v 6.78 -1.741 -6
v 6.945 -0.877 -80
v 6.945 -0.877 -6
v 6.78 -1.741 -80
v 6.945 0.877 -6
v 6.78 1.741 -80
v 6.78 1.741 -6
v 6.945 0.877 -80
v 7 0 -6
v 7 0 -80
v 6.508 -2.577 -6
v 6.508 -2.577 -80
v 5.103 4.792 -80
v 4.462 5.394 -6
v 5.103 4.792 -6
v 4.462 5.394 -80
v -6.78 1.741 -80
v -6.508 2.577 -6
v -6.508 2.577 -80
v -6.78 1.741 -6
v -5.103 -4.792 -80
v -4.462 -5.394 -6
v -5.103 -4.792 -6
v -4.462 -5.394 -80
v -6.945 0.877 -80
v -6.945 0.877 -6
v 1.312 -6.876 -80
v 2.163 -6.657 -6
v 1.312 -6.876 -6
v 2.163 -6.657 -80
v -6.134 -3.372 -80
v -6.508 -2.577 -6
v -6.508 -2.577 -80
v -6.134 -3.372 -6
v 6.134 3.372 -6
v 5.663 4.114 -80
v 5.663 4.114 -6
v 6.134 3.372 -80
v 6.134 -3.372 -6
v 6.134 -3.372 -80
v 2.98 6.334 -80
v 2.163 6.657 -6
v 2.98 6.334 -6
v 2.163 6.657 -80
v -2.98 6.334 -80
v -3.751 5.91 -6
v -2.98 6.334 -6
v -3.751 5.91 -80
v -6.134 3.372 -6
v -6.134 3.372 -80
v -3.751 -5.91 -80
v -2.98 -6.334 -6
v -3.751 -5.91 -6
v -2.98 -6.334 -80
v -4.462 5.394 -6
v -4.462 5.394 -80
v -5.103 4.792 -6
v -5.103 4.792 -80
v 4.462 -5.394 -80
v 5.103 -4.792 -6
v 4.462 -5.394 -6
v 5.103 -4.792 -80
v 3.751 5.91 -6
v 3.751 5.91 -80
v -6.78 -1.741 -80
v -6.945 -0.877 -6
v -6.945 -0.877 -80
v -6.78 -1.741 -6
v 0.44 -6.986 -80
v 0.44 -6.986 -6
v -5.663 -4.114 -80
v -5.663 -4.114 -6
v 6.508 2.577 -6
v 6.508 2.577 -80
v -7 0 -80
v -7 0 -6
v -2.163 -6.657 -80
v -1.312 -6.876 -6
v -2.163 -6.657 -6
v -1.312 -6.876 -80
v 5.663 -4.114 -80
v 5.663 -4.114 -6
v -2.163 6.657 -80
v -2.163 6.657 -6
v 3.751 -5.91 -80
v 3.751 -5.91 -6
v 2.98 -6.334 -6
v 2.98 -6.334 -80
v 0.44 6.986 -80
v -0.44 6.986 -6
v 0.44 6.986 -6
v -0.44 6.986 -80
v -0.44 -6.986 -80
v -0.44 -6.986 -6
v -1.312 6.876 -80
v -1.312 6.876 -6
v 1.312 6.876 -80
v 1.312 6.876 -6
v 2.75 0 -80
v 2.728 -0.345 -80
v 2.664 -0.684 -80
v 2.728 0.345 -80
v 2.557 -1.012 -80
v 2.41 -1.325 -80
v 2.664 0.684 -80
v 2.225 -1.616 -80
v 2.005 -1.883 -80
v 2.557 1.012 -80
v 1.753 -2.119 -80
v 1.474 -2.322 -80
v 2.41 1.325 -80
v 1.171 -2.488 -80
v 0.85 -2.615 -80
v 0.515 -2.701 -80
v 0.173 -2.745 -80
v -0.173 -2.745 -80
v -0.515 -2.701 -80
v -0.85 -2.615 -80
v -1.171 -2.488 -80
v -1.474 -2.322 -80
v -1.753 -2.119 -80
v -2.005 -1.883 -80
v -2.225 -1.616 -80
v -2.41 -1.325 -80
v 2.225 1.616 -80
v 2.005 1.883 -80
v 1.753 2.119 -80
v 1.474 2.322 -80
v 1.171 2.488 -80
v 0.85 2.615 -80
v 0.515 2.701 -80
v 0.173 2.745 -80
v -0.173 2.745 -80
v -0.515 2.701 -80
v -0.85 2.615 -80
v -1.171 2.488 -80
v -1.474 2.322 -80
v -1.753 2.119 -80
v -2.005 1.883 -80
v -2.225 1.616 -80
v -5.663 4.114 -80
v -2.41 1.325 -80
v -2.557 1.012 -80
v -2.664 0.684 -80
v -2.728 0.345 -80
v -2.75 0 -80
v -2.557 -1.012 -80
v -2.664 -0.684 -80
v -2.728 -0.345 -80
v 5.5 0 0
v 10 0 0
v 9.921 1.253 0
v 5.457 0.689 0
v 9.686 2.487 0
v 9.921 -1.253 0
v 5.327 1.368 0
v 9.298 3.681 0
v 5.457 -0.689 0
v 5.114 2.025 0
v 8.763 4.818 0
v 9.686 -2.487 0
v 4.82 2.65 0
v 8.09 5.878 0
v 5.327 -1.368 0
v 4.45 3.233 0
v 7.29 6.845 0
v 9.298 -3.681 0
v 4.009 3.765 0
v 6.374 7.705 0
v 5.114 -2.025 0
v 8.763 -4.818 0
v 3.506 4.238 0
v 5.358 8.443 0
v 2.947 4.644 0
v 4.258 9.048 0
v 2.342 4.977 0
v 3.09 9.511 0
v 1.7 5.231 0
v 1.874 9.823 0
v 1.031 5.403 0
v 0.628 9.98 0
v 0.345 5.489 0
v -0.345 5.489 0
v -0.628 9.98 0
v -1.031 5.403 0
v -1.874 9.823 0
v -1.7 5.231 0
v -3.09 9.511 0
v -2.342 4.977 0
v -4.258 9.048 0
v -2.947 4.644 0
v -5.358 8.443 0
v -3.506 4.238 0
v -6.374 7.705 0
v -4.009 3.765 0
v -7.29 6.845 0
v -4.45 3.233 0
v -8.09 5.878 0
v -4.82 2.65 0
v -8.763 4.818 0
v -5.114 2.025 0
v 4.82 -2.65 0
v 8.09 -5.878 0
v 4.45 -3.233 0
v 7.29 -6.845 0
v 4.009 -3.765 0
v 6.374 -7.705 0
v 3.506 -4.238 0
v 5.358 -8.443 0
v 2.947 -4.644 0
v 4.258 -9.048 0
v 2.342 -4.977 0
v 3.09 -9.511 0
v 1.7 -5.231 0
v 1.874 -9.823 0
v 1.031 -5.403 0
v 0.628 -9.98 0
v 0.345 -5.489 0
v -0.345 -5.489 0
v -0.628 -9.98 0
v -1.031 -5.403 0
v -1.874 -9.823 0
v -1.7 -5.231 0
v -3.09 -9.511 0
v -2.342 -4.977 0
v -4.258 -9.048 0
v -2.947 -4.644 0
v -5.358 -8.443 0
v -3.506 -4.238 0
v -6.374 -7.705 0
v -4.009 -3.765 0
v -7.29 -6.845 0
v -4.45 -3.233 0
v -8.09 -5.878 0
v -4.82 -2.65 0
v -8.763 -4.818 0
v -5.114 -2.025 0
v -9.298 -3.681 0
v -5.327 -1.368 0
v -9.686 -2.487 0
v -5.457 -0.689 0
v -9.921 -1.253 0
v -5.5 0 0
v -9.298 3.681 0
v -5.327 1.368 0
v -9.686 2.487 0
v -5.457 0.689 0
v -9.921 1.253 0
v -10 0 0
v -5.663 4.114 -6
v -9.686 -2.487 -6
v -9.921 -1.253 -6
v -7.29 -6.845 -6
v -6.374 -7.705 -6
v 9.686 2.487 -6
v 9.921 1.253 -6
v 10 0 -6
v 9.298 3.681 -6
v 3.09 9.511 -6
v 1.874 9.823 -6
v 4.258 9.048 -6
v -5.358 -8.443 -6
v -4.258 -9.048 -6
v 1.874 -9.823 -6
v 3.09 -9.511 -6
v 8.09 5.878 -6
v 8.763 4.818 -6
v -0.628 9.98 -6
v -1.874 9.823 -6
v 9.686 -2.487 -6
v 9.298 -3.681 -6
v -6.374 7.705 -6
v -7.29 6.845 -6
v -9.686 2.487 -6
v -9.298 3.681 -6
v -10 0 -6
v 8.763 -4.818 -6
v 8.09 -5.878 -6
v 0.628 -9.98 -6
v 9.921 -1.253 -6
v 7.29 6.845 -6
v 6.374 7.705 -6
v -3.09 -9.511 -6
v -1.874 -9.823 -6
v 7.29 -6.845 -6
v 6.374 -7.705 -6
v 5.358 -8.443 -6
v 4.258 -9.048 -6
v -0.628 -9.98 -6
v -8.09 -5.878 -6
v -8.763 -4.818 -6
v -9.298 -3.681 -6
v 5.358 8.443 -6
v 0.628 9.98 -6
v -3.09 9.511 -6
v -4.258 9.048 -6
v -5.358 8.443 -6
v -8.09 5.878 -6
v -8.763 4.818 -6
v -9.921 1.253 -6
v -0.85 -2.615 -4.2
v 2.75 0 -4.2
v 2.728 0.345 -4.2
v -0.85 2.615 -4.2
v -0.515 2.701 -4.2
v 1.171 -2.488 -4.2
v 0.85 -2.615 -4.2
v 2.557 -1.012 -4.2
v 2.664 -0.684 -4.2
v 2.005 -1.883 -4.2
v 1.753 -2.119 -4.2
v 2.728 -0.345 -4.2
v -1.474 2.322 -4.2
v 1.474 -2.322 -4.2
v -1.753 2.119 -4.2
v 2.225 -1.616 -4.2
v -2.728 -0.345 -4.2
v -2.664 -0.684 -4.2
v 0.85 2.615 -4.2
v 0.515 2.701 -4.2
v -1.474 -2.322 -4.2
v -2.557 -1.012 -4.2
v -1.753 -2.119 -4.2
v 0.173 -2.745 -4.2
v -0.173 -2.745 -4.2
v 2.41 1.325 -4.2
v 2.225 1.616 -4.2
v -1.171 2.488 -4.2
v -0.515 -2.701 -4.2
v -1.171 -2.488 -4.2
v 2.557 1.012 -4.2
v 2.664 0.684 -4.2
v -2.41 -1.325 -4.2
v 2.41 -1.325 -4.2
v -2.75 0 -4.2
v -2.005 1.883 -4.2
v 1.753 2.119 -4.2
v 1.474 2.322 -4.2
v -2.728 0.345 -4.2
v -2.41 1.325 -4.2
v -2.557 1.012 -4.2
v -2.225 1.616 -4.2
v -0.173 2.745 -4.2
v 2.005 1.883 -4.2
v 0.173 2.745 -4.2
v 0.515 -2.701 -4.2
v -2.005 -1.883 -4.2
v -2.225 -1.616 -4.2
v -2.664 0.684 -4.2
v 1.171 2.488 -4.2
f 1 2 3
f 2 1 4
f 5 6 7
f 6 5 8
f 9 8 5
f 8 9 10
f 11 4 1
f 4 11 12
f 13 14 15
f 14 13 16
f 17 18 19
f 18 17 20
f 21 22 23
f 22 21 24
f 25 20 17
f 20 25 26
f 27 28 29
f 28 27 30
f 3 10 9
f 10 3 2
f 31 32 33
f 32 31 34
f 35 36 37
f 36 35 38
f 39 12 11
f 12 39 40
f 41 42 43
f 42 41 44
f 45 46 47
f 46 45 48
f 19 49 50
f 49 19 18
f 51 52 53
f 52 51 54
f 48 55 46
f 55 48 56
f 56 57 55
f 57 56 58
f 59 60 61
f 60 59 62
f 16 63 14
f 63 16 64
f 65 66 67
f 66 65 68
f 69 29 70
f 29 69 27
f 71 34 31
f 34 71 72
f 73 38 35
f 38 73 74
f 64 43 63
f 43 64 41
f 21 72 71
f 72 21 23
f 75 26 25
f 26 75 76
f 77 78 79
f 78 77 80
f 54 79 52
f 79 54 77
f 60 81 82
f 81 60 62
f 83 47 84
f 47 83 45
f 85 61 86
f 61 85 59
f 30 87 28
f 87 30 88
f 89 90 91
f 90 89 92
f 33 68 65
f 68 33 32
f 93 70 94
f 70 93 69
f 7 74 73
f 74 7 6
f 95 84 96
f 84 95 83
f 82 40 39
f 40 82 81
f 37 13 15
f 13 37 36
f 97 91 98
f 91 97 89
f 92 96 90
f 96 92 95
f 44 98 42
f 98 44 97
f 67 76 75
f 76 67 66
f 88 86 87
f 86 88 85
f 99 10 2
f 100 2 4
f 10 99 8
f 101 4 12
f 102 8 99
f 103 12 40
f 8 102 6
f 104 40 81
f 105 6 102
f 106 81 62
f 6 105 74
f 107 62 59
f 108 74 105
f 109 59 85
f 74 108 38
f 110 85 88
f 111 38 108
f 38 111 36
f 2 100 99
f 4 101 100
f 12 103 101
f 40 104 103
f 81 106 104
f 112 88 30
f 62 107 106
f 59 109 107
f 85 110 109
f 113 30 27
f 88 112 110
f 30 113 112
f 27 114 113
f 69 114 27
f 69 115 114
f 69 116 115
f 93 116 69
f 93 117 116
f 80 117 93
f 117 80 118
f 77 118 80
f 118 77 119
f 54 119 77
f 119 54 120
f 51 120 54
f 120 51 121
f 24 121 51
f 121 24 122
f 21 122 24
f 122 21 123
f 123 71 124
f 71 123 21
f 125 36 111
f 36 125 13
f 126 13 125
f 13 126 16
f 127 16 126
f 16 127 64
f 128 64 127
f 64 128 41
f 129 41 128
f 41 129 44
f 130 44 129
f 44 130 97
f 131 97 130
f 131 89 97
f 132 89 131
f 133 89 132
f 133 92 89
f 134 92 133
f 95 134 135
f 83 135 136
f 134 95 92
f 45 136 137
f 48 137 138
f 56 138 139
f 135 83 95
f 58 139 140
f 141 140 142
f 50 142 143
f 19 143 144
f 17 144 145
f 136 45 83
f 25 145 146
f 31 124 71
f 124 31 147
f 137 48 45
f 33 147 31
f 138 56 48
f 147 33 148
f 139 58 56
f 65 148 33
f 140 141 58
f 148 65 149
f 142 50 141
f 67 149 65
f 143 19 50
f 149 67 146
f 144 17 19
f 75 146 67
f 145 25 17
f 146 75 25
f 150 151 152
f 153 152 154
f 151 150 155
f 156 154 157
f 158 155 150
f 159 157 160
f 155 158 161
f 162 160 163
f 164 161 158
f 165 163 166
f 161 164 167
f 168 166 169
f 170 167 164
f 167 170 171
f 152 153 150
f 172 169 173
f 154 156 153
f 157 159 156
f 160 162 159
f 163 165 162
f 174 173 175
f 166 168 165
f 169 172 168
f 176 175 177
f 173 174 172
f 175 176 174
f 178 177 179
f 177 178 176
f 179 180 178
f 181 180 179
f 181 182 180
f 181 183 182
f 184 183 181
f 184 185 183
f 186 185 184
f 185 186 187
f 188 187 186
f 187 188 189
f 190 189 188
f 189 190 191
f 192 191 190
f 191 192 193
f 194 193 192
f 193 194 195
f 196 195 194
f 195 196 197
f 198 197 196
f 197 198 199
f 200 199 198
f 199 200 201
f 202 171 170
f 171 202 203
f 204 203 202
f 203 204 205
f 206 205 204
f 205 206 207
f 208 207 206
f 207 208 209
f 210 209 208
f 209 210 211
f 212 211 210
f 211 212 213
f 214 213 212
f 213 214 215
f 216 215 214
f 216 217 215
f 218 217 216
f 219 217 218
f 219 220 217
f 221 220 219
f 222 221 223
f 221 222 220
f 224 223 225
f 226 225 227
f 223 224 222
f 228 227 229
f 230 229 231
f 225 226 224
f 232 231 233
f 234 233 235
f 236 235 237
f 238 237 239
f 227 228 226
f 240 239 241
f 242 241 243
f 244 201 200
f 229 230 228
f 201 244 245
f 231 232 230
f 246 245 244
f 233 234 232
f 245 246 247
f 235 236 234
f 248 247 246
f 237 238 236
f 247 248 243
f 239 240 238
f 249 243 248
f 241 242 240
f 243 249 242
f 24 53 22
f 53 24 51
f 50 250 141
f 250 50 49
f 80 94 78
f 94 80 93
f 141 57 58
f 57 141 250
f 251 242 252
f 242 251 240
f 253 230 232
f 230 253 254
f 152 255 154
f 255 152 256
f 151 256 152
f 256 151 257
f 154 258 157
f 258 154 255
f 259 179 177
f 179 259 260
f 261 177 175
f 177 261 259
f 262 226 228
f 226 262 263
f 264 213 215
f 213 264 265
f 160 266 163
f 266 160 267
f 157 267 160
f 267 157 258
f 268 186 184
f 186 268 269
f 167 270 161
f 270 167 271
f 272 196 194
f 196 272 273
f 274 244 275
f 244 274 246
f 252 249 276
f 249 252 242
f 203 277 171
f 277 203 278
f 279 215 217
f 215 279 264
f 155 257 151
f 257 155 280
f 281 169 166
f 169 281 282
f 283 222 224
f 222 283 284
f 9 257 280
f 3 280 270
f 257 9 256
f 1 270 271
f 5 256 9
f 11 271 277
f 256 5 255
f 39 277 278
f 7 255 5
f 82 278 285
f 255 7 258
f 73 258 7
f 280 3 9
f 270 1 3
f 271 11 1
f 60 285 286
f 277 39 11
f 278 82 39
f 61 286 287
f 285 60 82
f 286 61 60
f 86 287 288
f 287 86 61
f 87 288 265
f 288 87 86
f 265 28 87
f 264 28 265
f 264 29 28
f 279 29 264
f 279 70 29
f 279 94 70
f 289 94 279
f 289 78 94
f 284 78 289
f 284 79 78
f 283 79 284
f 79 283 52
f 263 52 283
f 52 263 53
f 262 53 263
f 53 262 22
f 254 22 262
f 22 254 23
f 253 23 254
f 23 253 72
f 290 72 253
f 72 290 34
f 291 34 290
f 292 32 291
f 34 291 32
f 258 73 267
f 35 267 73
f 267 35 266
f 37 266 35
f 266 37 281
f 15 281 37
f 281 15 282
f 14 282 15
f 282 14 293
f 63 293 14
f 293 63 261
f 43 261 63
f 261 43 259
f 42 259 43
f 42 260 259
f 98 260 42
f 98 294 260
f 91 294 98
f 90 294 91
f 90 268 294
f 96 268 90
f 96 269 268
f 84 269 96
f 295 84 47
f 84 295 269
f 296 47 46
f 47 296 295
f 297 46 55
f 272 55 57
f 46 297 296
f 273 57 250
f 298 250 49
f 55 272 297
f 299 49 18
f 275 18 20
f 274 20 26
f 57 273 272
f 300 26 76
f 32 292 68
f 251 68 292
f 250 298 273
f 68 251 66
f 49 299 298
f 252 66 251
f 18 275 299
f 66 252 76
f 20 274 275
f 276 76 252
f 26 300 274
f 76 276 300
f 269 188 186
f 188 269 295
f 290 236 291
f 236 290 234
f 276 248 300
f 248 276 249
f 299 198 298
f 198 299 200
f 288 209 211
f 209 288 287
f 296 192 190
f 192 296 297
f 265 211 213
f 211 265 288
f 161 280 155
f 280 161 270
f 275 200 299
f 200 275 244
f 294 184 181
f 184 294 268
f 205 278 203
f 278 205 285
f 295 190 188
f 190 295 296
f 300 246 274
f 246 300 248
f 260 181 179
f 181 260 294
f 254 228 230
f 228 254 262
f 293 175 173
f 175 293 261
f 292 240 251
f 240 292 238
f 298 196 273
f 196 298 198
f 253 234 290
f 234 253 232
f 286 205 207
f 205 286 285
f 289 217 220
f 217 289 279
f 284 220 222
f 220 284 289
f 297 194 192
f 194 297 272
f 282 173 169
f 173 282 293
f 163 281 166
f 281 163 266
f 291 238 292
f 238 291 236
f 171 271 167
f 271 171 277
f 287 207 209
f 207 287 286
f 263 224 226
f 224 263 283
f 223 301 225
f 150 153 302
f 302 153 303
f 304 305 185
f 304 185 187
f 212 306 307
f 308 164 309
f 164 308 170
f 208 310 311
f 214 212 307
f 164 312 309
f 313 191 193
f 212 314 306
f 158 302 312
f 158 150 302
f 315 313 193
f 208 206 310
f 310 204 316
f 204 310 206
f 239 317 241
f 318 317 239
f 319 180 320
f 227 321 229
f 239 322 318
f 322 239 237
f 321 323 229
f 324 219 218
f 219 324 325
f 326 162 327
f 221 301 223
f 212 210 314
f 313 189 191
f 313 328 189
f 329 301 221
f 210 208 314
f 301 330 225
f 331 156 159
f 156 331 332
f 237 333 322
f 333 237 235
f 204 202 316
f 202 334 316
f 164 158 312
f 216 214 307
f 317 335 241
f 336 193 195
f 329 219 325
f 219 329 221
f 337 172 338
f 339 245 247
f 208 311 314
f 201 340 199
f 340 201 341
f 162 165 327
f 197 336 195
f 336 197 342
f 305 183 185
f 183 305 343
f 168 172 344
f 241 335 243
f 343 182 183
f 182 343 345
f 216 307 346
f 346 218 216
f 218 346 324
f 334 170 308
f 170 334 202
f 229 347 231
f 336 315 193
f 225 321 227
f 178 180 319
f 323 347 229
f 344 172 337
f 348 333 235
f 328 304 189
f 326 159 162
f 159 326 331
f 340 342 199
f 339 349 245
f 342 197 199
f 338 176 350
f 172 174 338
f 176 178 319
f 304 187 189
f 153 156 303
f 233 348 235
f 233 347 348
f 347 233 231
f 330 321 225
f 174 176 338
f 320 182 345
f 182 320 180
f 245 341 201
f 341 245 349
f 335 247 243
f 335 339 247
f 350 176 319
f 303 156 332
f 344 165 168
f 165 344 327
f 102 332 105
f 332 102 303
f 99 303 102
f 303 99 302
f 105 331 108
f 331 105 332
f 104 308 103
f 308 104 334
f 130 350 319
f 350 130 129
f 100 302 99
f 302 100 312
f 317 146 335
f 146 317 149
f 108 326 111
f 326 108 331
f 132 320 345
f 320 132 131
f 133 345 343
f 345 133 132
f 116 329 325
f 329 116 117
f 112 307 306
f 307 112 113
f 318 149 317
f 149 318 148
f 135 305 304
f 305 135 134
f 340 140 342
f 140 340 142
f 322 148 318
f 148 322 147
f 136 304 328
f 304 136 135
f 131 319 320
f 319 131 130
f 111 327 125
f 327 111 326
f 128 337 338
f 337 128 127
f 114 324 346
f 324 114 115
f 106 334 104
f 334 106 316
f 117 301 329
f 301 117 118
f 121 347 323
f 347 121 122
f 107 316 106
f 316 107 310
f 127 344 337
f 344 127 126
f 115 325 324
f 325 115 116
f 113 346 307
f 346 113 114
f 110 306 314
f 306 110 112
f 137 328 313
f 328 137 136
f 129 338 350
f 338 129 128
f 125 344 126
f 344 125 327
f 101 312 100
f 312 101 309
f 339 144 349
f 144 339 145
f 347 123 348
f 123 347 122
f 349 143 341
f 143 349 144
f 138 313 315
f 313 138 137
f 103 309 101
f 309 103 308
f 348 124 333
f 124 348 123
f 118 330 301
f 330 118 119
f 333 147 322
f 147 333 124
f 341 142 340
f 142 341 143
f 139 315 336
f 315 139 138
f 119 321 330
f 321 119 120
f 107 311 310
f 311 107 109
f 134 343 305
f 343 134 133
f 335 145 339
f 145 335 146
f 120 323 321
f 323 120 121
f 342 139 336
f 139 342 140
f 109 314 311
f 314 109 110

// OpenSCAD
$fn = 50;


difference() {
	union() {
		translate(v = [0, 0, -80.0000000000]) {
			cylinder(h = 80, r = 7.0000000000);
		}
		translate(v = [0, 0, -6.0000000000]) {
			cylinder(h = 6, r = 10.0000000000);
		}
	}
	union() {
		translate(v = [0, 0, 0]) {
			rotate(a = [0, 0, 0]) {
				difference() {
					union() {
						#translate(v = [0, 0, -80.0000000000]) {
							cylinder(h = 80, r = 2.2500000000);
						}
						#translate(v = [0, 0, -4.2000000000]) {
							cylinder(h = 4.2000000000, r = 7.0000000000, r1 = 2.7500000000, r2 = 5.5000000000);
						}
						#translate(v = [0, 0, -80.0000000000]) {
							cylinder(h = 80, r = 2.7500000000);
						}
						#translate(v = [0, 0, -80.0000000000]) {
							cylinder(h = 80, r = 2.2500000000);
						}
					}
					union();
				}
			}
		}
	}
}
